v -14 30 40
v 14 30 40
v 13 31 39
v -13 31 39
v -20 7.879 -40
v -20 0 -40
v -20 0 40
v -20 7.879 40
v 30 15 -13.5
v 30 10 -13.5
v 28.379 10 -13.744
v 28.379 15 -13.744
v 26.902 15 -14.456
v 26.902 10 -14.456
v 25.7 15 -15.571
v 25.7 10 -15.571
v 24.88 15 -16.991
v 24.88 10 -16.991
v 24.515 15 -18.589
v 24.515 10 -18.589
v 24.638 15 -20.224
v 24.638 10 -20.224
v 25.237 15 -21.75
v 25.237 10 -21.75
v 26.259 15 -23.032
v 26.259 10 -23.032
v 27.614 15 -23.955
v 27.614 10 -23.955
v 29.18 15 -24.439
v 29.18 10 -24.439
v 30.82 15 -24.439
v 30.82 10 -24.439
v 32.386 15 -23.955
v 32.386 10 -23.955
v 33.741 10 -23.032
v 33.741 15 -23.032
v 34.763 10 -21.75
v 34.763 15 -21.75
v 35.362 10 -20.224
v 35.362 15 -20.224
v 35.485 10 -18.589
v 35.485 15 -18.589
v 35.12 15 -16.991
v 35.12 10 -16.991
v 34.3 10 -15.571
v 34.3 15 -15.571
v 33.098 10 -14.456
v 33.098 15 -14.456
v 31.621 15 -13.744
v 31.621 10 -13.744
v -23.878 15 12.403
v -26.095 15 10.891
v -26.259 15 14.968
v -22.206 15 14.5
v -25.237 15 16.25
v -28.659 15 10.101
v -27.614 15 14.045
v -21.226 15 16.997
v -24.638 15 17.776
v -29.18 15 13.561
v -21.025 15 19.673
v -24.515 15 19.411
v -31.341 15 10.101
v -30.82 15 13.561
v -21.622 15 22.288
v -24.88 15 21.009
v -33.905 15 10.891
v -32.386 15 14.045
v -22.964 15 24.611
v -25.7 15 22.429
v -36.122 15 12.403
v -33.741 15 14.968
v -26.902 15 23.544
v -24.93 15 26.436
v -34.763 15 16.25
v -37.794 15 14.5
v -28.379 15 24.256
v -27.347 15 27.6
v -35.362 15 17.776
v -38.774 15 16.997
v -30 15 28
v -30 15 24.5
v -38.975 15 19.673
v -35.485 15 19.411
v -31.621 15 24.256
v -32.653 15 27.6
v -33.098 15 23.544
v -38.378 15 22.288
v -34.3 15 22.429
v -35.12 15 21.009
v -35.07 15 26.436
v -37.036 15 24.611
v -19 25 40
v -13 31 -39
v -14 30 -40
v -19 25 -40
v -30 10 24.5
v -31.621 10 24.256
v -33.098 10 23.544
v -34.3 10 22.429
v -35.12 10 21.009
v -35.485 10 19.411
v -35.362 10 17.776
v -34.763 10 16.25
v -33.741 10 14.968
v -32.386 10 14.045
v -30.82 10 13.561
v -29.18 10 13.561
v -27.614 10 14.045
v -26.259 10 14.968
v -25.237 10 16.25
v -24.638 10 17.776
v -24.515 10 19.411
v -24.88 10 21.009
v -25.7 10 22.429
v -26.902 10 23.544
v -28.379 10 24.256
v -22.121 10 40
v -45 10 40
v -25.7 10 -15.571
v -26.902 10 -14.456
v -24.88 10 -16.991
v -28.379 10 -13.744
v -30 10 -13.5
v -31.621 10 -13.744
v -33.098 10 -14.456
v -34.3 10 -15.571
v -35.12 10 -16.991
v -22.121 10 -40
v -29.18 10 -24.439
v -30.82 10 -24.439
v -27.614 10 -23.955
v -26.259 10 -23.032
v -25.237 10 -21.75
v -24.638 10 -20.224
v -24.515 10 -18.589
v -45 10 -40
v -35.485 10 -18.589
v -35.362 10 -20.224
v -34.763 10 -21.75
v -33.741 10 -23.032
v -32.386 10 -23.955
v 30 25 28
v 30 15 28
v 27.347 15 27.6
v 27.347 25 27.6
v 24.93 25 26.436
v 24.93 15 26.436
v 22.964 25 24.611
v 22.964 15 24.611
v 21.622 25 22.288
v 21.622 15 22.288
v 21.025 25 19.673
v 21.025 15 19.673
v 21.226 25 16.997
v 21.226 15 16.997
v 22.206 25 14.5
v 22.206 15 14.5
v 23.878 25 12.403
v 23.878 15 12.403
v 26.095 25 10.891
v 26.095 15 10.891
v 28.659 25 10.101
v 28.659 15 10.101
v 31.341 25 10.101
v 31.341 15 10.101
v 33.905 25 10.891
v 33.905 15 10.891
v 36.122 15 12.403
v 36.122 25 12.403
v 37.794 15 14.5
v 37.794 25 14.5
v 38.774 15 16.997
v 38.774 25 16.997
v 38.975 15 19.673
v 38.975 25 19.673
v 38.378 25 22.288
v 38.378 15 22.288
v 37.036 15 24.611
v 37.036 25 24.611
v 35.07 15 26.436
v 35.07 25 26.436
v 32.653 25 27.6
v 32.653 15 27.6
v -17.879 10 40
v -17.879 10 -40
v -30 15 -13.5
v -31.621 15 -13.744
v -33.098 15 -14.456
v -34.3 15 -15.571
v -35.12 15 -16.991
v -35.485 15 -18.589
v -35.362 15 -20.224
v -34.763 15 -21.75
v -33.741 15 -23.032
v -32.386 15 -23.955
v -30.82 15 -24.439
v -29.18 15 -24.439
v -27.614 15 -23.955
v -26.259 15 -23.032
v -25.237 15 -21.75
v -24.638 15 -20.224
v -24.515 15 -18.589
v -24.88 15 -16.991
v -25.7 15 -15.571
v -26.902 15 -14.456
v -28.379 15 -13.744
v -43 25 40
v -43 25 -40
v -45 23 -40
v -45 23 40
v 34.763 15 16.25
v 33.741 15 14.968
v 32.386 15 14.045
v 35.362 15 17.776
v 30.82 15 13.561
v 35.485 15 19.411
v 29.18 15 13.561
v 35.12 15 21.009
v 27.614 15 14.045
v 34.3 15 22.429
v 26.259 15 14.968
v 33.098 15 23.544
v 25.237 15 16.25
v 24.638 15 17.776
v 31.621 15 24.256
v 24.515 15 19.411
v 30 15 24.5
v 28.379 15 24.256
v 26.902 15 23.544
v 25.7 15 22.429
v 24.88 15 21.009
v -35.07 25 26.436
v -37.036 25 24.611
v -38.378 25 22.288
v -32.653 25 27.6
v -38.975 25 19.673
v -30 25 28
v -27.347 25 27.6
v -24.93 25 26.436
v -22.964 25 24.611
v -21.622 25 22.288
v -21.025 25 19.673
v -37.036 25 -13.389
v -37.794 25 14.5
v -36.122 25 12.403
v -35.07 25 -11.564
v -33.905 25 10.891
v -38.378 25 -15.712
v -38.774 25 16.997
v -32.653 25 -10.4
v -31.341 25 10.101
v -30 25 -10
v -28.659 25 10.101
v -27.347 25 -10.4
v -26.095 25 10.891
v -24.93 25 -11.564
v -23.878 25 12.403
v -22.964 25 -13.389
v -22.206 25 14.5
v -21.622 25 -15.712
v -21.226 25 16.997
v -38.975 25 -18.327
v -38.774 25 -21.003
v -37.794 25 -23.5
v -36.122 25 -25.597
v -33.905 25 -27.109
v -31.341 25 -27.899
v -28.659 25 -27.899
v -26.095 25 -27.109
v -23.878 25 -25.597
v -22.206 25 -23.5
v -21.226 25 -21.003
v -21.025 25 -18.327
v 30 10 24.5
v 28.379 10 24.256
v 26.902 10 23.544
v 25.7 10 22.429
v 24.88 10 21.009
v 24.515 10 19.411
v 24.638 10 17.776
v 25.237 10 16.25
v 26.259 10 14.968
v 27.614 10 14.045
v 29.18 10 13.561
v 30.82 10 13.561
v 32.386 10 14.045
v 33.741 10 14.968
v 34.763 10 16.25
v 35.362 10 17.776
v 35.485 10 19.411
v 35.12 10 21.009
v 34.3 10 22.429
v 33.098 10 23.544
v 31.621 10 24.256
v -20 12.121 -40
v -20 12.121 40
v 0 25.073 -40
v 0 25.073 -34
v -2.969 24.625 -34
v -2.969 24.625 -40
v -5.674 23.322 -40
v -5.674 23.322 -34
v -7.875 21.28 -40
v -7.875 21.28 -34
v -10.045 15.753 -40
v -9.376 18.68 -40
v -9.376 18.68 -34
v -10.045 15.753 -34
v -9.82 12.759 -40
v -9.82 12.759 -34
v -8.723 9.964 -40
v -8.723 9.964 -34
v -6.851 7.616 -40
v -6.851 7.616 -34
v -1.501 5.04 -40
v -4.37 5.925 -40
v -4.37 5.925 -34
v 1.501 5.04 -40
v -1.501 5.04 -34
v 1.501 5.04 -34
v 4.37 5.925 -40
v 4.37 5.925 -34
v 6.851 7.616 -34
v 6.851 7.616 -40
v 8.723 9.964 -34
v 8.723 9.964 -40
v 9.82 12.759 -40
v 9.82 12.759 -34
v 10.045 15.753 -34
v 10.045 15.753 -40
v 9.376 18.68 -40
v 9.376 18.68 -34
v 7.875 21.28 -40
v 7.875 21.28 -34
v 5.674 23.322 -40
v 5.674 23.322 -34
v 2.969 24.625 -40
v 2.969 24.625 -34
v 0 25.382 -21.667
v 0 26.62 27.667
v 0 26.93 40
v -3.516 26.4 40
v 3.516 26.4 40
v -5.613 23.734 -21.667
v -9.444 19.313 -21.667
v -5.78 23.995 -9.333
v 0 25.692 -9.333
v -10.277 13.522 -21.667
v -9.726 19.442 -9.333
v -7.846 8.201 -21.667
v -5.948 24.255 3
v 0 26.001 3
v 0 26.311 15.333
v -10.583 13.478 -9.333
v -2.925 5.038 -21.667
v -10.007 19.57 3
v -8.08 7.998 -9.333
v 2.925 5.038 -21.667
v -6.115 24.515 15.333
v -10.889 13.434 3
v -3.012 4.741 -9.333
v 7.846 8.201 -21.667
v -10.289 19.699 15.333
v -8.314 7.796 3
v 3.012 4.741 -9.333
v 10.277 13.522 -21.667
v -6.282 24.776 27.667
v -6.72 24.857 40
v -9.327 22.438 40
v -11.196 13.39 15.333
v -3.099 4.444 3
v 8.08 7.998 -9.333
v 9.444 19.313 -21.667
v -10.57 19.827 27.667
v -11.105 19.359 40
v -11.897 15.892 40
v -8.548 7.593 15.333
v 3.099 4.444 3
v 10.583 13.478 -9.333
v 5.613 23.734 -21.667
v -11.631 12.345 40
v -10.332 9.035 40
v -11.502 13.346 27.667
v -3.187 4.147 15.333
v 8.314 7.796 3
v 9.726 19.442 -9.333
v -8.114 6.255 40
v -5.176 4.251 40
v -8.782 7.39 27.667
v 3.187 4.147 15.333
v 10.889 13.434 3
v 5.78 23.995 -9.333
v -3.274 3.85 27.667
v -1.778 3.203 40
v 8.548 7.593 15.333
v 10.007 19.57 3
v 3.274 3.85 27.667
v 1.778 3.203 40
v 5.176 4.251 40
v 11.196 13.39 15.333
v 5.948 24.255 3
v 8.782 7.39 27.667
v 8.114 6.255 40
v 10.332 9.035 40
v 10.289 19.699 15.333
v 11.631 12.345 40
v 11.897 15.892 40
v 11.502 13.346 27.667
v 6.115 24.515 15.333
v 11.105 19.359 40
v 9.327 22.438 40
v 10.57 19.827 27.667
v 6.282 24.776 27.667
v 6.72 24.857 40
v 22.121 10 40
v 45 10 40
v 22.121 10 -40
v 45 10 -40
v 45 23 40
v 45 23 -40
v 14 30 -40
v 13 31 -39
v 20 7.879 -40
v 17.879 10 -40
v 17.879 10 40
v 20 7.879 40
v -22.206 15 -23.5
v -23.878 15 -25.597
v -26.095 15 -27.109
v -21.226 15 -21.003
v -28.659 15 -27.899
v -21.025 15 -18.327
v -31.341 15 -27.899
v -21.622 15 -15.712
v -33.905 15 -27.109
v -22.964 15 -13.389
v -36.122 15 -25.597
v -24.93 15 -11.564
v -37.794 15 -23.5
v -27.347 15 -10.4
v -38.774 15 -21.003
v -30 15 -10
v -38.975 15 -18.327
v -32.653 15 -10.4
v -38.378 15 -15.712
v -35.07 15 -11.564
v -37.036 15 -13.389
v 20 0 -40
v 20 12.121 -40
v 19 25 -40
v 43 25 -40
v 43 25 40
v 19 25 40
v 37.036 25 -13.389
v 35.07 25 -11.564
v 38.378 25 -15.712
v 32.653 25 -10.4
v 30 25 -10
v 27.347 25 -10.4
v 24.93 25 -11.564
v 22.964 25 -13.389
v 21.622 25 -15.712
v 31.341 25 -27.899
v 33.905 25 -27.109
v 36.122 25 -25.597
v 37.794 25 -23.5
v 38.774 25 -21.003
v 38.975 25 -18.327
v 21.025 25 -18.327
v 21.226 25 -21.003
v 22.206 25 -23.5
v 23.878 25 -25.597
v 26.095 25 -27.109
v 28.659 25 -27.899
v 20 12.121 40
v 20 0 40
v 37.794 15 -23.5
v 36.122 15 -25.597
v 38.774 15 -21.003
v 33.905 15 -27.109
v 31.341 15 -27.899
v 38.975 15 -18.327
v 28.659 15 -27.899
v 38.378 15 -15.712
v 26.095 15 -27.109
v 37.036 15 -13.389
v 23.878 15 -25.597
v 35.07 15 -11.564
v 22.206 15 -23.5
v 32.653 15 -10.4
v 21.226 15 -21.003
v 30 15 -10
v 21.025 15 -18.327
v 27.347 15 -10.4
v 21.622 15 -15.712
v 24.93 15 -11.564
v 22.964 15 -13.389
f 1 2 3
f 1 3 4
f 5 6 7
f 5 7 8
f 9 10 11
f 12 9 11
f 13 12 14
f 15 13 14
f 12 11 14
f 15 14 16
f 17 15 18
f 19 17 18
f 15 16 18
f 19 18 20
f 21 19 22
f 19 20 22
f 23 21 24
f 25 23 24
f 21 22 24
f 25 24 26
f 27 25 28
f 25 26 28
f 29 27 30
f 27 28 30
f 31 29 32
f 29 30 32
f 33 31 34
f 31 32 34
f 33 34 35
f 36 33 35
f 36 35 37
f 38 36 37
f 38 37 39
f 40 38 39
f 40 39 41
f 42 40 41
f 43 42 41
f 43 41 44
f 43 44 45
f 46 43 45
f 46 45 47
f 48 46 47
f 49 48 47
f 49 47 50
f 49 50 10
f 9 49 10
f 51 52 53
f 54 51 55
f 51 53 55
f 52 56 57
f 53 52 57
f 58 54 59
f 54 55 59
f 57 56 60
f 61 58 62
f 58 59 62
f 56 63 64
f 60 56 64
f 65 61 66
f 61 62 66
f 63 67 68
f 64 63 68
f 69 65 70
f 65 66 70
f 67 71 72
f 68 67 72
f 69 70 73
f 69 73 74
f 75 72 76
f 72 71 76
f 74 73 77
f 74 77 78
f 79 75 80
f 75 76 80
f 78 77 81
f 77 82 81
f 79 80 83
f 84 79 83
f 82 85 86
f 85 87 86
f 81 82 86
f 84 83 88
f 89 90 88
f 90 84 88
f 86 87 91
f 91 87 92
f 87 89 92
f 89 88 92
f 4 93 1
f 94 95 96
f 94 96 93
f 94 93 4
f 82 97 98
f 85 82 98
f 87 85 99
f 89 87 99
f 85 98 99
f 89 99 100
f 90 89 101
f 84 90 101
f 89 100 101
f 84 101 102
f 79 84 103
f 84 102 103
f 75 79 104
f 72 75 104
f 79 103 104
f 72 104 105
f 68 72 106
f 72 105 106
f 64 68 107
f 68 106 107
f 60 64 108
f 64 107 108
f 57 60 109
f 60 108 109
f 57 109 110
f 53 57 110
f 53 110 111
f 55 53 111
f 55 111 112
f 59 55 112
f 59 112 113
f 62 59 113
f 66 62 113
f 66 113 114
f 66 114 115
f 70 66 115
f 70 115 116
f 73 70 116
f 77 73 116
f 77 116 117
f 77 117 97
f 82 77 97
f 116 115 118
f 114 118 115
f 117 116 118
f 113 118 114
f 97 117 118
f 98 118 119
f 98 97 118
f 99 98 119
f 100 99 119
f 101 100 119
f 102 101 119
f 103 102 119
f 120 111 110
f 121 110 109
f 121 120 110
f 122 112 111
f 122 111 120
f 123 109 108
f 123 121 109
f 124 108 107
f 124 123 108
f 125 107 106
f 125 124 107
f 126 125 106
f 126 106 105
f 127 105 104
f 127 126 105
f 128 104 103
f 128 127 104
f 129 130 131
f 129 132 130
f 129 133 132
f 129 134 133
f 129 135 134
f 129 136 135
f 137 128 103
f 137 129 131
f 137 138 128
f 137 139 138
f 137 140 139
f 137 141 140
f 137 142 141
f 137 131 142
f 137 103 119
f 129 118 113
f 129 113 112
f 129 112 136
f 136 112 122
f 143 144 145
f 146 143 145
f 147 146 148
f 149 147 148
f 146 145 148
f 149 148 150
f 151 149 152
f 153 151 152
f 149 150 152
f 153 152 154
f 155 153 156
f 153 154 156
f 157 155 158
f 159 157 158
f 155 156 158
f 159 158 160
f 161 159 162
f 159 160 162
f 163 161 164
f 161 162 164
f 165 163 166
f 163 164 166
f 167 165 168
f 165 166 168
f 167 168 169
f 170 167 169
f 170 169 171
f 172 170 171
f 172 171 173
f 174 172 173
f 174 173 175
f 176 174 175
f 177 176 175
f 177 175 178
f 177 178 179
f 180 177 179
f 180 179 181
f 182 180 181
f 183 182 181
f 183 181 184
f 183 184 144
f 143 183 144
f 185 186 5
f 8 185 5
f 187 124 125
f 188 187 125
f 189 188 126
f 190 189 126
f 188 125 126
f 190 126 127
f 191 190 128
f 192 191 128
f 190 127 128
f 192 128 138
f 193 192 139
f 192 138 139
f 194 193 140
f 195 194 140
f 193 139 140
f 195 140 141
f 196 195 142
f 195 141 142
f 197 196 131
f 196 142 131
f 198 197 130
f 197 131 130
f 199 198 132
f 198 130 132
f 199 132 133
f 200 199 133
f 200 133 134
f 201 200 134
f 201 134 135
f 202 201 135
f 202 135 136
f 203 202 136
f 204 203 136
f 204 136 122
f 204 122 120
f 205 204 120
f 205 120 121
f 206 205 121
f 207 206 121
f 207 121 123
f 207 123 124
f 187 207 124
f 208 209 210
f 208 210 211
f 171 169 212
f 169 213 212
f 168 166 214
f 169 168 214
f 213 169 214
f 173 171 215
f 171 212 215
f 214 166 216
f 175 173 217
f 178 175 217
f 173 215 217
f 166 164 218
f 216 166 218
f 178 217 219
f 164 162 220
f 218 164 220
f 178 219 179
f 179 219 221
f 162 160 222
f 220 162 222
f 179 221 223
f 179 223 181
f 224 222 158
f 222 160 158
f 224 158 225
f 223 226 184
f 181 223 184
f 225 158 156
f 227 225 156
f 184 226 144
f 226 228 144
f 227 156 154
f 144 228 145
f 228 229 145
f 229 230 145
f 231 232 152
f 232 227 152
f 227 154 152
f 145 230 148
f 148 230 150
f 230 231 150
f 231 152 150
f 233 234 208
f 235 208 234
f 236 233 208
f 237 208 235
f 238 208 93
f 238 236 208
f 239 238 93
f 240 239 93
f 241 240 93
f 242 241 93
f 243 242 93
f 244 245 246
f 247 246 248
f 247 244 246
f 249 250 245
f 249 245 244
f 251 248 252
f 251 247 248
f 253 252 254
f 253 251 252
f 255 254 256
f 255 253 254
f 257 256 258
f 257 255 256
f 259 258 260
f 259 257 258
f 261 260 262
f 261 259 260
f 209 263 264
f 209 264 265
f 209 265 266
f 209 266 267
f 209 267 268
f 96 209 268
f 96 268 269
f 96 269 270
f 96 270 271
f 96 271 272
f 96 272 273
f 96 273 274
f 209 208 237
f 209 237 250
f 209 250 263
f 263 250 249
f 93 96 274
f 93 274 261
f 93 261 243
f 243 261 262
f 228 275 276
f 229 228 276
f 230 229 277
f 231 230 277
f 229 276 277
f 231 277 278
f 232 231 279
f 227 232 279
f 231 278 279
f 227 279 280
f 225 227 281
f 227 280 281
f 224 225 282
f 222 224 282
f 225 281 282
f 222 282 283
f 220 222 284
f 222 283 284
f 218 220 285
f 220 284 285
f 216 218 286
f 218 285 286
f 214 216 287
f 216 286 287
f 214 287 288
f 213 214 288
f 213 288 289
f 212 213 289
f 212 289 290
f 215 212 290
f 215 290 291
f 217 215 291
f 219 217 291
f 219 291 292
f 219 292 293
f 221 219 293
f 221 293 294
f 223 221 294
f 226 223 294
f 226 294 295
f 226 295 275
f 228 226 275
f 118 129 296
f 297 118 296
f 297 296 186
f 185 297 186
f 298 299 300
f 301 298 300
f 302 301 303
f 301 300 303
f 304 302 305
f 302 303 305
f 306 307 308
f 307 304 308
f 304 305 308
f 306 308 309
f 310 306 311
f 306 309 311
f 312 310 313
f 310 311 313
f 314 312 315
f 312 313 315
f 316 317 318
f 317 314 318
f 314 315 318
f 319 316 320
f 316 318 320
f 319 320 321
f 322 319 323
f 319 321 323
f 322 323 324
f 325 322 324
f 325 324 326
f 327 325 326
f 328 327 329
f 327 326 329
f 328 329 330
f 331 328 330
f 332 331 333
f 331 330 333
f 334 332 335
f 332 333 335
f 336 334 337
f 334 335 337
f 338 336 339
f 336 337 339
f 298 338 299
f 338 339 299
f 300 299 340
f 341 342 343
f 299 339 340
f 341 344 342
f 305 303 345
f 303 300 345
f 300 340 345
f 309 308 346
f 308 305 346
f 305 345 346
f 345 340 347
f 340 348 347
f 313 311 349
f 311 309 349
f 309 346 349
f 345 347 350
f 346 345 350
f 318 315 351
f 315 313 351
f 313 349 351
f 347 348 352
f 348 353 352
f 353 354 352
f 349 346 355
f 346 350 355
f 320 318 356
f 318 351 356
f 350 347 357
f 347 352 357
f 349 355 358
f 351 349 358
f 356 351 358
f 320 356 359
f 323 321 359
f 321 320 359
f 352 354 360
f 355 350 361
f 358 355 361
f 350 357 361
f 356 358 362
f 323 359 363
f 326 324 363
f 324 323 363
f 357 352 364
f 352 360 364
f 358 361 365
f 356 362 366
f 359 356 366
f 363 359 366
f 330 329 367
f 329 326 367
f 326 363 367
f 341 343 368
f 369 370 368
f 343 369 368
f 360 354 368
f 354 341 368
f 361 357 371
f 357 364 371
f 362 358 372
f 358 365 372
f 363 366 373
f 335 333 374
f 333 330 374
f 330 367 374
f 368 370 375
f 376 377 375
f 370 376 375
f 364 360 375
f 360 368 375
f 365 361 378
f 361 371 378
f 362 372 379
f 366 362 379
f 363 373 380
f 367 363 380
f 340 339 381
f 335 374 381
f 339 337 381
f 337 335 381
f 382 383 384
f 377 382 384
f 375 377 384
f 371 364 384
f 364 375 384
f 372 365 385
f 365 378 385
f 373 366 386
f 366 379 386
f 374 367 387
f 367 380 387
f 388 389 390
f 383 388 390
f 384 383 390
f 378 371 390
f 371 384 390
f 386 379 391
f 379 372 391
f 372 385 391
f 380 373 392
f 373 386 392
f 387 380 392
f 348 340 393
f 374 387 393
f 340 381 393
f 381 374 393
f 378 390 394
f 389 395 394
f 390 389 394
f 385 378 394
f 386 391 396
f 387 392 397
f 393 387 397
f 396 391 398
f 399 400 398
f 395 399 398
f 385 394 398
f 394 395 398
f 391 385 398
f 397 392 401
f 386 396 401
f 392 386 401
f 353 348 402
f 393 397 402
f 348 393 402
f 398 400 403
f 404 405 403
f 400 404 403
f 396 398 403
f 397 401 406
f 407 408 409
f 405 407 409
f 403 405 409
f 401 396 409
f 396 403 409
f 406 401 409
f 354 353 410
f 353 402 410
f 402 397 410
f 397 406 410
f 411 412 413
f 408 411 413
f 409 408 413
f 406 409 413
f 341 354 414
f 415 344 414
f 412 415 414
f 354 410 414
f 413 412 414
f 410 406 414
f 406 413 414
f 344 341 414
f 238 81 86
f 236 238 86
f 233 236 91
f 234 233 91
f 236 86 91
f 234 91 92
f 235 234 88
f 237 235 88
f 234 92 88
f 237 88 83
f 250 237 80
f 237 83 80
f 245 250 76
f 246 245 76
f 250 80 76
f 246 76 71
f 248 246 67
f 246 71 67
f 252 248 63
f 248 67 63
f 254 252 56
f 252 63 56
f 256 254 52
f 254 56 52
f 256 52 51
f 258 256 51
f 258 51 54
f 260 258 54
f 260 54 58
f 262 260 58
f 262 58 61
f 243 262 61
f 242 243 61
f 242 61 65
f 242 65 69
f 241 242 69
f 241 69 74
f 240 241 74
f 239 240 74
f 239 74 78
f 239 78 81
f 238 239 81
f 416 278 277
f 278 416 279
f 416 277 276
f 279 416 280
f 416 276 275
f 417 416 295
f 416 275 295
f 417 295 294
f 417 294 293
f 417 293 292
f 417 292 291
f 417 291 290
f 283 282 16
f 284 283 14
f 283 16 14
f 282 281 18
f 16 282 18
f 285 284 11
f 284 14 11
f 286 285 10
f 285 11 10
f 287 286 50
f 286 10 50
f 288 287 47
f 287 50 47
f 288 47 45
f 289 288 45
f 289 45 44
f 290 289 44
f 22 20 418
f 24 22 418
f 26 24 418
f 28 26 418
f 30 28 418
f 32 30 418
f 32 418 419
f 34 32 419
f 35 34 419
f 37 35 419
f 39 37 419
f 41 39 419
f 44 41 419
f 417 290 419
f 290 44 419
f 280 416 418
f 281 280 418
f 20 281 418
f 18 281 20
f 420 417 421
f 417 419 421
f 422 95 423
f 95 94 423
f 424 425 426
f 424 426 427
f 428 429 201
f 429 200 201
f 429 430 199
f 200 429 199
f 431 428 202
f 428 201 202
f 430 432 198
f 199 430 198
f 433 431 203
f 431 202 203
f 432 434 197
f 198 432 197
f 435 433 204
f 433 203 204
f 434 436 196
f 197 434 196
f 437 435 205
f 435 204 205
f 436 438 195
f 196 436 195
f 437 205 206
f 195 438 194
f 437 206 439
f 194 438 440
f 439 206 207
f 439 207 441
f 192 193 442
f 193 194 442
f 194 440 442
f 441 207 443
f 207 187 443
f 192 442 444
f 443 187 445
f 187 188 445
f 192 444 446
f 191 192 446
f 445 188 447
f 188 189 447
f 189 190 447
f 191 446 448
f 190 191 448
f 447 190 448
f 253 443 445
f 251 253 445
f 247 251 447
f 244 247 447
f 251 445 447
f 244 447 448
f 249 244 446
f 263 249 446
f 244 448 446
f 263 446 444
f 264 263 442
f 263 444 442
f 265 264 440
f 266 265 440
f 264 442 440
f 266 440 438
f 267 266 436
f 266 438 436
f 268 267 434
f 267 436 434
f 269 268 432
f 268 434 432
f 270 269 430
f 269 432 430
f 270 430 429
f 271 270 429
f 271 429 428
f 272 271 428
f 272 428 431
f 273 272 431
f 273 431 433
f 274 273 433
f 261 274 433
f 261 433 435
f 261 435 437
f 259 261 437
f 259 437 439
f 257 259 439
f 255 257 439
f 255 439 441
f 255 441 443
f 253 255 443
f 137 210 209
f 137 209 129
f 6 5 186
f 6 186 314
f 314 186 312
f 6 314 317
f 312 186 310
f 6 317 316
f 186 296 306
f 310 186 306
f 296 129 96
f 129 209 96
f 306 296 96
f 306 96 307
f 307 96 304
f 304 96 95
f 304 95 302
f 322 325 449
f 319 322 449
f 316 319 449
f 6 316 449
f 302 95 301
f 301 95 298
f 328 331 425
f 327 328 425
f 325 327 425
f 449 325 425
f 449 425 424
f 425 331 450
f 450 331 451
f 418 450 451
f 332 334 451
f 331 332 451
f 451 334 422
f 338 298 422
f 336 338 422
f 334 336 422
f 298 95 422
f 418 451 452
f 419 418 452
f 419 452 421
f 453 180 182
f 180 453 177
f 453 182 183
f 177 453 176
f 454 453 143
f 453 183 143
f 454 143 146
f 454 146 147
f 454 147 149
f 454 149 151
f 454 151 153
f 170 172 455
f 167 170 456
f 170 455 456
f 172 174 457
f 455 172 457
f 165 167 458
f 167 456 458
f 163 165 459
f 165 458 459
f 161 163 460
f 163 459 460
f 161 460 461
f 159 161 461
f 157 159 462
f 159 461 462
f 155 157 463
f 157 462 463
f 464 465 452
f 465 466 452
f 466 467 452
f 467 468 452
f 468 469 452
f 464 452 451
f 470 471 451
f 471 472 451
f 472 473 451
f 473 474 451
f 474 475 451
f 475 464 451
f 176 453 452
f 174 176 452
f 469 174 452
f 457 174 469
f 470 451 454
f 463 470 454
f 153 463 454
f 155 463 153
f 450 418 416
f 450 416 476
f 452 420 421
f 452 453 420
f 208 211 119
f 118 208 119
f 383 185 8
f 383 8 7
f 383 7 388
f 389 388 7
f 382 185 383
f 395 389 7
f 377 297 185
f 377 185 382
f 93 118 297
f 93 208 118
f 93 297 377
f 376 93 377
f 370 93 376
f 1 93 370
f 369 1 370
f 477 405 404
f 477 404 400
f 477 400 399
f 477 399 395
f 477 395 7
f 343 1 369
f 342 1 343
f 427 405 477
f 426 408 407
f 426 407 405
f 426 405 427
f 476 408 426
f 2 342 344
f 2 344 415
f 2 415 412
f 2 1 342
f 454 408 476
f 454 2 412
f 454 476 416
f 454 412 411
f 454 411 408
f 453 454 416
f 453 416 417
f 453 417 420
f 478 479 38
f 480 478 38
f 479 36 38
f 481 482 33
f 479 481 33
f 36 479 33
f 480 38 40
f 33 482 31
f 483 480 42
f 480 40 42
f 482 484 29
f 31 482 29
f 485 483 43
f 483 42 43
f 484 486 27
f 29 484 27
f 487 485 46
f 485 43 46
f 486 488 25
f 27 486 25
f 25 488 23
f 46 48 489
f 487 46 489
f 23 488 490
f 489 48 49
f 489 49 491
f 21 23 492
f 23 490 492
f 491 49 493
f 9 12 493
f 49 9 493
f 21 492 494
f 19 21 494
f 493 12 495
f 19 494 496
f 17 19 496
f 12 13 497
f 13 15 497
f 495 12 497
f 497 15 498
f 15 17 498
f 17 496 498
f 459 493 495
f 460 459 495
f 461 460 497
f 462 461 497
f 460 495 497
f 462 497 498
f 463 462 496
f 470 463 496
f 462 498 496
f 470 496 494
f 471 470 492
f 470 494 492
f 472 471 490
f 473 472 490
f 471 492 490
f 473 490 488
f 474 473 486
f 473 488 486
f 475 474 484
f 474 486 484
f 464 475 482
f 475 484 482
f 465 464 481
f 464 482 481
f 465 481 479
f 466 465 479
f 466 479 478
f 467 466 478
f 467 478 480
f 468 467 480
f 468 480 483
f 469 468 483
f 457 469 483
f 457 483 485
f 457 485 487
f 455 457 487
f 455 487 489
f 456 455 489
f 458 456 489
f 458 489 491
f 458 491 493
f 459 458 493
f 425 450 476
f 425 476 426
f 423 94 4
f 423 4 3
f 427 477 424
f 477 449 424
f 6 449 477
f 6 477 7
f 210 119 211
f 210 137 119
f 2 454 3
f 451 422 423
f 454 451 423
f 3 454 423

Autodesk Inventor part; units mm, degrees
ref_plane "YZ Plane" through (0, 0, 0) normal (1, 0, 0) x (0, 1, 0)
ref_plane "XZ Plane" through (0, 0, 0) normal (0, 1, 0) x (-1, 0, 0)
ref_plane "XY Plane" through (0, 0, 0) normal (0, 0, 1) x (1, 0, 0)
sketch "Sketch1" plane through (0, 0, 0) normal (0, 0, 1) x (1, 0, 0)
  line L0 (0, 0) -> (0, 31)
  line L1 (0, 0) -> (-20, 0)
  line L2 (-20, 0) -> (-20, 7.8787)
  line L3 (-22.1213, 10) -> (-45, 10)
  line L4 (-45, 10) -> (-45, 25)
  line L5 (-45, 25) -> (-19, 25)
  line L6 (-19, 25) -> (-13, 31)
  line L7 (-13, 31) -> (0, 31)
  line L8 (-22.1213, 10) -> (-20, 12.1213)
  line L9 (-20, 12.1213) -> (-17.8787, 10)
  line L10 (-17.8787, 10) -> (-20, 7.8787)
  line L11 (0, 0) -> (20, 0)
  line L12 (20, 0) -> (20, 7.8787)
  line L13 (22.1213, 10) -> (45, 10)
  line L14 (45, 10) -> (45, 25)
  line L15 (45, 25) -> (19, 25)
  line L16 (19, 25) -> (13, 31)
  line L17 (13, 31) -> (0, 31)
  line L18 (22.1213, 10) -> (20, 12.1213)
  line L19 (20, 12.1213) -> (17.8787, 10)
  line L20 (17.8787, 10) -> (20, 7.8787)
  dimension "d0" = 31
  dimension "d1" = 10
  dimension "d2" = 15
  dimension "d3" = 45
  dimension "d4" = 3
  dimension "d5" = 38
  dimension "d6" = 90
  dimension "d7" = 40
extrude "Extrusion1" add sketch "Sketch1" along normal mid plane 80
sketch "Sketch2" plane through (0, 0, 0) normal (1, 0, 0) x (0, 1, 0)
  line L0 (15, 40) -> (15, -40)
  line L1 (15, -40) -> (25.0727, -40)
  line L2 (25.0727, -40) -> (25.0727, -34)
  line L3 (25.0727, -34) -> (26.93, 40)
  line L4 (26.93, 40) -> (15, 40)
  line L5 (0, -40) -> (0, 40) projected
  point P0 (0, 0)
  point P1 (31, 40)
  point P2 (31, -40)
  dimension "d10" = 74
  dimension "d11" = 23.86
  dimension "d12" = 1.438
  dimension "d13" = 15
revolve "Revolution1" cut sketch "Sketch2" angle 360 about axis through (0, 15, 40) along (0, 0, -1)
sketch "Sketch3" plane through (19, 25, 40) normal (0, 1, 0) x (1, 0, 0)
  point P0 (-19, 40)
  point P1 (-49, 21)
  dimension "d15" = 19
  dimension "d16" = 30
hole "Hole1" at (-30, 25, 19) direction (0, -1, 0) diameter 11 end through all counterbore diameter 18 counterbore depth 10
pattern_linear "Rectangular Pattern1" count 2 spacing 60 along (1, 0, 0) count 2 spacing 38 along (0, 0, -1) of "Hole1"
chamfer "Chamfer1" distance 2 angle 45 2 edges at (-45, 25, 0) (45, 25, 0)
chamfer "Chamfer2" distance 1 angle 45 2 edges at (0, 31, 40) (0, 31, -40)
properties part number "Part040. Tool Holder" material "Steel, Alloy"
